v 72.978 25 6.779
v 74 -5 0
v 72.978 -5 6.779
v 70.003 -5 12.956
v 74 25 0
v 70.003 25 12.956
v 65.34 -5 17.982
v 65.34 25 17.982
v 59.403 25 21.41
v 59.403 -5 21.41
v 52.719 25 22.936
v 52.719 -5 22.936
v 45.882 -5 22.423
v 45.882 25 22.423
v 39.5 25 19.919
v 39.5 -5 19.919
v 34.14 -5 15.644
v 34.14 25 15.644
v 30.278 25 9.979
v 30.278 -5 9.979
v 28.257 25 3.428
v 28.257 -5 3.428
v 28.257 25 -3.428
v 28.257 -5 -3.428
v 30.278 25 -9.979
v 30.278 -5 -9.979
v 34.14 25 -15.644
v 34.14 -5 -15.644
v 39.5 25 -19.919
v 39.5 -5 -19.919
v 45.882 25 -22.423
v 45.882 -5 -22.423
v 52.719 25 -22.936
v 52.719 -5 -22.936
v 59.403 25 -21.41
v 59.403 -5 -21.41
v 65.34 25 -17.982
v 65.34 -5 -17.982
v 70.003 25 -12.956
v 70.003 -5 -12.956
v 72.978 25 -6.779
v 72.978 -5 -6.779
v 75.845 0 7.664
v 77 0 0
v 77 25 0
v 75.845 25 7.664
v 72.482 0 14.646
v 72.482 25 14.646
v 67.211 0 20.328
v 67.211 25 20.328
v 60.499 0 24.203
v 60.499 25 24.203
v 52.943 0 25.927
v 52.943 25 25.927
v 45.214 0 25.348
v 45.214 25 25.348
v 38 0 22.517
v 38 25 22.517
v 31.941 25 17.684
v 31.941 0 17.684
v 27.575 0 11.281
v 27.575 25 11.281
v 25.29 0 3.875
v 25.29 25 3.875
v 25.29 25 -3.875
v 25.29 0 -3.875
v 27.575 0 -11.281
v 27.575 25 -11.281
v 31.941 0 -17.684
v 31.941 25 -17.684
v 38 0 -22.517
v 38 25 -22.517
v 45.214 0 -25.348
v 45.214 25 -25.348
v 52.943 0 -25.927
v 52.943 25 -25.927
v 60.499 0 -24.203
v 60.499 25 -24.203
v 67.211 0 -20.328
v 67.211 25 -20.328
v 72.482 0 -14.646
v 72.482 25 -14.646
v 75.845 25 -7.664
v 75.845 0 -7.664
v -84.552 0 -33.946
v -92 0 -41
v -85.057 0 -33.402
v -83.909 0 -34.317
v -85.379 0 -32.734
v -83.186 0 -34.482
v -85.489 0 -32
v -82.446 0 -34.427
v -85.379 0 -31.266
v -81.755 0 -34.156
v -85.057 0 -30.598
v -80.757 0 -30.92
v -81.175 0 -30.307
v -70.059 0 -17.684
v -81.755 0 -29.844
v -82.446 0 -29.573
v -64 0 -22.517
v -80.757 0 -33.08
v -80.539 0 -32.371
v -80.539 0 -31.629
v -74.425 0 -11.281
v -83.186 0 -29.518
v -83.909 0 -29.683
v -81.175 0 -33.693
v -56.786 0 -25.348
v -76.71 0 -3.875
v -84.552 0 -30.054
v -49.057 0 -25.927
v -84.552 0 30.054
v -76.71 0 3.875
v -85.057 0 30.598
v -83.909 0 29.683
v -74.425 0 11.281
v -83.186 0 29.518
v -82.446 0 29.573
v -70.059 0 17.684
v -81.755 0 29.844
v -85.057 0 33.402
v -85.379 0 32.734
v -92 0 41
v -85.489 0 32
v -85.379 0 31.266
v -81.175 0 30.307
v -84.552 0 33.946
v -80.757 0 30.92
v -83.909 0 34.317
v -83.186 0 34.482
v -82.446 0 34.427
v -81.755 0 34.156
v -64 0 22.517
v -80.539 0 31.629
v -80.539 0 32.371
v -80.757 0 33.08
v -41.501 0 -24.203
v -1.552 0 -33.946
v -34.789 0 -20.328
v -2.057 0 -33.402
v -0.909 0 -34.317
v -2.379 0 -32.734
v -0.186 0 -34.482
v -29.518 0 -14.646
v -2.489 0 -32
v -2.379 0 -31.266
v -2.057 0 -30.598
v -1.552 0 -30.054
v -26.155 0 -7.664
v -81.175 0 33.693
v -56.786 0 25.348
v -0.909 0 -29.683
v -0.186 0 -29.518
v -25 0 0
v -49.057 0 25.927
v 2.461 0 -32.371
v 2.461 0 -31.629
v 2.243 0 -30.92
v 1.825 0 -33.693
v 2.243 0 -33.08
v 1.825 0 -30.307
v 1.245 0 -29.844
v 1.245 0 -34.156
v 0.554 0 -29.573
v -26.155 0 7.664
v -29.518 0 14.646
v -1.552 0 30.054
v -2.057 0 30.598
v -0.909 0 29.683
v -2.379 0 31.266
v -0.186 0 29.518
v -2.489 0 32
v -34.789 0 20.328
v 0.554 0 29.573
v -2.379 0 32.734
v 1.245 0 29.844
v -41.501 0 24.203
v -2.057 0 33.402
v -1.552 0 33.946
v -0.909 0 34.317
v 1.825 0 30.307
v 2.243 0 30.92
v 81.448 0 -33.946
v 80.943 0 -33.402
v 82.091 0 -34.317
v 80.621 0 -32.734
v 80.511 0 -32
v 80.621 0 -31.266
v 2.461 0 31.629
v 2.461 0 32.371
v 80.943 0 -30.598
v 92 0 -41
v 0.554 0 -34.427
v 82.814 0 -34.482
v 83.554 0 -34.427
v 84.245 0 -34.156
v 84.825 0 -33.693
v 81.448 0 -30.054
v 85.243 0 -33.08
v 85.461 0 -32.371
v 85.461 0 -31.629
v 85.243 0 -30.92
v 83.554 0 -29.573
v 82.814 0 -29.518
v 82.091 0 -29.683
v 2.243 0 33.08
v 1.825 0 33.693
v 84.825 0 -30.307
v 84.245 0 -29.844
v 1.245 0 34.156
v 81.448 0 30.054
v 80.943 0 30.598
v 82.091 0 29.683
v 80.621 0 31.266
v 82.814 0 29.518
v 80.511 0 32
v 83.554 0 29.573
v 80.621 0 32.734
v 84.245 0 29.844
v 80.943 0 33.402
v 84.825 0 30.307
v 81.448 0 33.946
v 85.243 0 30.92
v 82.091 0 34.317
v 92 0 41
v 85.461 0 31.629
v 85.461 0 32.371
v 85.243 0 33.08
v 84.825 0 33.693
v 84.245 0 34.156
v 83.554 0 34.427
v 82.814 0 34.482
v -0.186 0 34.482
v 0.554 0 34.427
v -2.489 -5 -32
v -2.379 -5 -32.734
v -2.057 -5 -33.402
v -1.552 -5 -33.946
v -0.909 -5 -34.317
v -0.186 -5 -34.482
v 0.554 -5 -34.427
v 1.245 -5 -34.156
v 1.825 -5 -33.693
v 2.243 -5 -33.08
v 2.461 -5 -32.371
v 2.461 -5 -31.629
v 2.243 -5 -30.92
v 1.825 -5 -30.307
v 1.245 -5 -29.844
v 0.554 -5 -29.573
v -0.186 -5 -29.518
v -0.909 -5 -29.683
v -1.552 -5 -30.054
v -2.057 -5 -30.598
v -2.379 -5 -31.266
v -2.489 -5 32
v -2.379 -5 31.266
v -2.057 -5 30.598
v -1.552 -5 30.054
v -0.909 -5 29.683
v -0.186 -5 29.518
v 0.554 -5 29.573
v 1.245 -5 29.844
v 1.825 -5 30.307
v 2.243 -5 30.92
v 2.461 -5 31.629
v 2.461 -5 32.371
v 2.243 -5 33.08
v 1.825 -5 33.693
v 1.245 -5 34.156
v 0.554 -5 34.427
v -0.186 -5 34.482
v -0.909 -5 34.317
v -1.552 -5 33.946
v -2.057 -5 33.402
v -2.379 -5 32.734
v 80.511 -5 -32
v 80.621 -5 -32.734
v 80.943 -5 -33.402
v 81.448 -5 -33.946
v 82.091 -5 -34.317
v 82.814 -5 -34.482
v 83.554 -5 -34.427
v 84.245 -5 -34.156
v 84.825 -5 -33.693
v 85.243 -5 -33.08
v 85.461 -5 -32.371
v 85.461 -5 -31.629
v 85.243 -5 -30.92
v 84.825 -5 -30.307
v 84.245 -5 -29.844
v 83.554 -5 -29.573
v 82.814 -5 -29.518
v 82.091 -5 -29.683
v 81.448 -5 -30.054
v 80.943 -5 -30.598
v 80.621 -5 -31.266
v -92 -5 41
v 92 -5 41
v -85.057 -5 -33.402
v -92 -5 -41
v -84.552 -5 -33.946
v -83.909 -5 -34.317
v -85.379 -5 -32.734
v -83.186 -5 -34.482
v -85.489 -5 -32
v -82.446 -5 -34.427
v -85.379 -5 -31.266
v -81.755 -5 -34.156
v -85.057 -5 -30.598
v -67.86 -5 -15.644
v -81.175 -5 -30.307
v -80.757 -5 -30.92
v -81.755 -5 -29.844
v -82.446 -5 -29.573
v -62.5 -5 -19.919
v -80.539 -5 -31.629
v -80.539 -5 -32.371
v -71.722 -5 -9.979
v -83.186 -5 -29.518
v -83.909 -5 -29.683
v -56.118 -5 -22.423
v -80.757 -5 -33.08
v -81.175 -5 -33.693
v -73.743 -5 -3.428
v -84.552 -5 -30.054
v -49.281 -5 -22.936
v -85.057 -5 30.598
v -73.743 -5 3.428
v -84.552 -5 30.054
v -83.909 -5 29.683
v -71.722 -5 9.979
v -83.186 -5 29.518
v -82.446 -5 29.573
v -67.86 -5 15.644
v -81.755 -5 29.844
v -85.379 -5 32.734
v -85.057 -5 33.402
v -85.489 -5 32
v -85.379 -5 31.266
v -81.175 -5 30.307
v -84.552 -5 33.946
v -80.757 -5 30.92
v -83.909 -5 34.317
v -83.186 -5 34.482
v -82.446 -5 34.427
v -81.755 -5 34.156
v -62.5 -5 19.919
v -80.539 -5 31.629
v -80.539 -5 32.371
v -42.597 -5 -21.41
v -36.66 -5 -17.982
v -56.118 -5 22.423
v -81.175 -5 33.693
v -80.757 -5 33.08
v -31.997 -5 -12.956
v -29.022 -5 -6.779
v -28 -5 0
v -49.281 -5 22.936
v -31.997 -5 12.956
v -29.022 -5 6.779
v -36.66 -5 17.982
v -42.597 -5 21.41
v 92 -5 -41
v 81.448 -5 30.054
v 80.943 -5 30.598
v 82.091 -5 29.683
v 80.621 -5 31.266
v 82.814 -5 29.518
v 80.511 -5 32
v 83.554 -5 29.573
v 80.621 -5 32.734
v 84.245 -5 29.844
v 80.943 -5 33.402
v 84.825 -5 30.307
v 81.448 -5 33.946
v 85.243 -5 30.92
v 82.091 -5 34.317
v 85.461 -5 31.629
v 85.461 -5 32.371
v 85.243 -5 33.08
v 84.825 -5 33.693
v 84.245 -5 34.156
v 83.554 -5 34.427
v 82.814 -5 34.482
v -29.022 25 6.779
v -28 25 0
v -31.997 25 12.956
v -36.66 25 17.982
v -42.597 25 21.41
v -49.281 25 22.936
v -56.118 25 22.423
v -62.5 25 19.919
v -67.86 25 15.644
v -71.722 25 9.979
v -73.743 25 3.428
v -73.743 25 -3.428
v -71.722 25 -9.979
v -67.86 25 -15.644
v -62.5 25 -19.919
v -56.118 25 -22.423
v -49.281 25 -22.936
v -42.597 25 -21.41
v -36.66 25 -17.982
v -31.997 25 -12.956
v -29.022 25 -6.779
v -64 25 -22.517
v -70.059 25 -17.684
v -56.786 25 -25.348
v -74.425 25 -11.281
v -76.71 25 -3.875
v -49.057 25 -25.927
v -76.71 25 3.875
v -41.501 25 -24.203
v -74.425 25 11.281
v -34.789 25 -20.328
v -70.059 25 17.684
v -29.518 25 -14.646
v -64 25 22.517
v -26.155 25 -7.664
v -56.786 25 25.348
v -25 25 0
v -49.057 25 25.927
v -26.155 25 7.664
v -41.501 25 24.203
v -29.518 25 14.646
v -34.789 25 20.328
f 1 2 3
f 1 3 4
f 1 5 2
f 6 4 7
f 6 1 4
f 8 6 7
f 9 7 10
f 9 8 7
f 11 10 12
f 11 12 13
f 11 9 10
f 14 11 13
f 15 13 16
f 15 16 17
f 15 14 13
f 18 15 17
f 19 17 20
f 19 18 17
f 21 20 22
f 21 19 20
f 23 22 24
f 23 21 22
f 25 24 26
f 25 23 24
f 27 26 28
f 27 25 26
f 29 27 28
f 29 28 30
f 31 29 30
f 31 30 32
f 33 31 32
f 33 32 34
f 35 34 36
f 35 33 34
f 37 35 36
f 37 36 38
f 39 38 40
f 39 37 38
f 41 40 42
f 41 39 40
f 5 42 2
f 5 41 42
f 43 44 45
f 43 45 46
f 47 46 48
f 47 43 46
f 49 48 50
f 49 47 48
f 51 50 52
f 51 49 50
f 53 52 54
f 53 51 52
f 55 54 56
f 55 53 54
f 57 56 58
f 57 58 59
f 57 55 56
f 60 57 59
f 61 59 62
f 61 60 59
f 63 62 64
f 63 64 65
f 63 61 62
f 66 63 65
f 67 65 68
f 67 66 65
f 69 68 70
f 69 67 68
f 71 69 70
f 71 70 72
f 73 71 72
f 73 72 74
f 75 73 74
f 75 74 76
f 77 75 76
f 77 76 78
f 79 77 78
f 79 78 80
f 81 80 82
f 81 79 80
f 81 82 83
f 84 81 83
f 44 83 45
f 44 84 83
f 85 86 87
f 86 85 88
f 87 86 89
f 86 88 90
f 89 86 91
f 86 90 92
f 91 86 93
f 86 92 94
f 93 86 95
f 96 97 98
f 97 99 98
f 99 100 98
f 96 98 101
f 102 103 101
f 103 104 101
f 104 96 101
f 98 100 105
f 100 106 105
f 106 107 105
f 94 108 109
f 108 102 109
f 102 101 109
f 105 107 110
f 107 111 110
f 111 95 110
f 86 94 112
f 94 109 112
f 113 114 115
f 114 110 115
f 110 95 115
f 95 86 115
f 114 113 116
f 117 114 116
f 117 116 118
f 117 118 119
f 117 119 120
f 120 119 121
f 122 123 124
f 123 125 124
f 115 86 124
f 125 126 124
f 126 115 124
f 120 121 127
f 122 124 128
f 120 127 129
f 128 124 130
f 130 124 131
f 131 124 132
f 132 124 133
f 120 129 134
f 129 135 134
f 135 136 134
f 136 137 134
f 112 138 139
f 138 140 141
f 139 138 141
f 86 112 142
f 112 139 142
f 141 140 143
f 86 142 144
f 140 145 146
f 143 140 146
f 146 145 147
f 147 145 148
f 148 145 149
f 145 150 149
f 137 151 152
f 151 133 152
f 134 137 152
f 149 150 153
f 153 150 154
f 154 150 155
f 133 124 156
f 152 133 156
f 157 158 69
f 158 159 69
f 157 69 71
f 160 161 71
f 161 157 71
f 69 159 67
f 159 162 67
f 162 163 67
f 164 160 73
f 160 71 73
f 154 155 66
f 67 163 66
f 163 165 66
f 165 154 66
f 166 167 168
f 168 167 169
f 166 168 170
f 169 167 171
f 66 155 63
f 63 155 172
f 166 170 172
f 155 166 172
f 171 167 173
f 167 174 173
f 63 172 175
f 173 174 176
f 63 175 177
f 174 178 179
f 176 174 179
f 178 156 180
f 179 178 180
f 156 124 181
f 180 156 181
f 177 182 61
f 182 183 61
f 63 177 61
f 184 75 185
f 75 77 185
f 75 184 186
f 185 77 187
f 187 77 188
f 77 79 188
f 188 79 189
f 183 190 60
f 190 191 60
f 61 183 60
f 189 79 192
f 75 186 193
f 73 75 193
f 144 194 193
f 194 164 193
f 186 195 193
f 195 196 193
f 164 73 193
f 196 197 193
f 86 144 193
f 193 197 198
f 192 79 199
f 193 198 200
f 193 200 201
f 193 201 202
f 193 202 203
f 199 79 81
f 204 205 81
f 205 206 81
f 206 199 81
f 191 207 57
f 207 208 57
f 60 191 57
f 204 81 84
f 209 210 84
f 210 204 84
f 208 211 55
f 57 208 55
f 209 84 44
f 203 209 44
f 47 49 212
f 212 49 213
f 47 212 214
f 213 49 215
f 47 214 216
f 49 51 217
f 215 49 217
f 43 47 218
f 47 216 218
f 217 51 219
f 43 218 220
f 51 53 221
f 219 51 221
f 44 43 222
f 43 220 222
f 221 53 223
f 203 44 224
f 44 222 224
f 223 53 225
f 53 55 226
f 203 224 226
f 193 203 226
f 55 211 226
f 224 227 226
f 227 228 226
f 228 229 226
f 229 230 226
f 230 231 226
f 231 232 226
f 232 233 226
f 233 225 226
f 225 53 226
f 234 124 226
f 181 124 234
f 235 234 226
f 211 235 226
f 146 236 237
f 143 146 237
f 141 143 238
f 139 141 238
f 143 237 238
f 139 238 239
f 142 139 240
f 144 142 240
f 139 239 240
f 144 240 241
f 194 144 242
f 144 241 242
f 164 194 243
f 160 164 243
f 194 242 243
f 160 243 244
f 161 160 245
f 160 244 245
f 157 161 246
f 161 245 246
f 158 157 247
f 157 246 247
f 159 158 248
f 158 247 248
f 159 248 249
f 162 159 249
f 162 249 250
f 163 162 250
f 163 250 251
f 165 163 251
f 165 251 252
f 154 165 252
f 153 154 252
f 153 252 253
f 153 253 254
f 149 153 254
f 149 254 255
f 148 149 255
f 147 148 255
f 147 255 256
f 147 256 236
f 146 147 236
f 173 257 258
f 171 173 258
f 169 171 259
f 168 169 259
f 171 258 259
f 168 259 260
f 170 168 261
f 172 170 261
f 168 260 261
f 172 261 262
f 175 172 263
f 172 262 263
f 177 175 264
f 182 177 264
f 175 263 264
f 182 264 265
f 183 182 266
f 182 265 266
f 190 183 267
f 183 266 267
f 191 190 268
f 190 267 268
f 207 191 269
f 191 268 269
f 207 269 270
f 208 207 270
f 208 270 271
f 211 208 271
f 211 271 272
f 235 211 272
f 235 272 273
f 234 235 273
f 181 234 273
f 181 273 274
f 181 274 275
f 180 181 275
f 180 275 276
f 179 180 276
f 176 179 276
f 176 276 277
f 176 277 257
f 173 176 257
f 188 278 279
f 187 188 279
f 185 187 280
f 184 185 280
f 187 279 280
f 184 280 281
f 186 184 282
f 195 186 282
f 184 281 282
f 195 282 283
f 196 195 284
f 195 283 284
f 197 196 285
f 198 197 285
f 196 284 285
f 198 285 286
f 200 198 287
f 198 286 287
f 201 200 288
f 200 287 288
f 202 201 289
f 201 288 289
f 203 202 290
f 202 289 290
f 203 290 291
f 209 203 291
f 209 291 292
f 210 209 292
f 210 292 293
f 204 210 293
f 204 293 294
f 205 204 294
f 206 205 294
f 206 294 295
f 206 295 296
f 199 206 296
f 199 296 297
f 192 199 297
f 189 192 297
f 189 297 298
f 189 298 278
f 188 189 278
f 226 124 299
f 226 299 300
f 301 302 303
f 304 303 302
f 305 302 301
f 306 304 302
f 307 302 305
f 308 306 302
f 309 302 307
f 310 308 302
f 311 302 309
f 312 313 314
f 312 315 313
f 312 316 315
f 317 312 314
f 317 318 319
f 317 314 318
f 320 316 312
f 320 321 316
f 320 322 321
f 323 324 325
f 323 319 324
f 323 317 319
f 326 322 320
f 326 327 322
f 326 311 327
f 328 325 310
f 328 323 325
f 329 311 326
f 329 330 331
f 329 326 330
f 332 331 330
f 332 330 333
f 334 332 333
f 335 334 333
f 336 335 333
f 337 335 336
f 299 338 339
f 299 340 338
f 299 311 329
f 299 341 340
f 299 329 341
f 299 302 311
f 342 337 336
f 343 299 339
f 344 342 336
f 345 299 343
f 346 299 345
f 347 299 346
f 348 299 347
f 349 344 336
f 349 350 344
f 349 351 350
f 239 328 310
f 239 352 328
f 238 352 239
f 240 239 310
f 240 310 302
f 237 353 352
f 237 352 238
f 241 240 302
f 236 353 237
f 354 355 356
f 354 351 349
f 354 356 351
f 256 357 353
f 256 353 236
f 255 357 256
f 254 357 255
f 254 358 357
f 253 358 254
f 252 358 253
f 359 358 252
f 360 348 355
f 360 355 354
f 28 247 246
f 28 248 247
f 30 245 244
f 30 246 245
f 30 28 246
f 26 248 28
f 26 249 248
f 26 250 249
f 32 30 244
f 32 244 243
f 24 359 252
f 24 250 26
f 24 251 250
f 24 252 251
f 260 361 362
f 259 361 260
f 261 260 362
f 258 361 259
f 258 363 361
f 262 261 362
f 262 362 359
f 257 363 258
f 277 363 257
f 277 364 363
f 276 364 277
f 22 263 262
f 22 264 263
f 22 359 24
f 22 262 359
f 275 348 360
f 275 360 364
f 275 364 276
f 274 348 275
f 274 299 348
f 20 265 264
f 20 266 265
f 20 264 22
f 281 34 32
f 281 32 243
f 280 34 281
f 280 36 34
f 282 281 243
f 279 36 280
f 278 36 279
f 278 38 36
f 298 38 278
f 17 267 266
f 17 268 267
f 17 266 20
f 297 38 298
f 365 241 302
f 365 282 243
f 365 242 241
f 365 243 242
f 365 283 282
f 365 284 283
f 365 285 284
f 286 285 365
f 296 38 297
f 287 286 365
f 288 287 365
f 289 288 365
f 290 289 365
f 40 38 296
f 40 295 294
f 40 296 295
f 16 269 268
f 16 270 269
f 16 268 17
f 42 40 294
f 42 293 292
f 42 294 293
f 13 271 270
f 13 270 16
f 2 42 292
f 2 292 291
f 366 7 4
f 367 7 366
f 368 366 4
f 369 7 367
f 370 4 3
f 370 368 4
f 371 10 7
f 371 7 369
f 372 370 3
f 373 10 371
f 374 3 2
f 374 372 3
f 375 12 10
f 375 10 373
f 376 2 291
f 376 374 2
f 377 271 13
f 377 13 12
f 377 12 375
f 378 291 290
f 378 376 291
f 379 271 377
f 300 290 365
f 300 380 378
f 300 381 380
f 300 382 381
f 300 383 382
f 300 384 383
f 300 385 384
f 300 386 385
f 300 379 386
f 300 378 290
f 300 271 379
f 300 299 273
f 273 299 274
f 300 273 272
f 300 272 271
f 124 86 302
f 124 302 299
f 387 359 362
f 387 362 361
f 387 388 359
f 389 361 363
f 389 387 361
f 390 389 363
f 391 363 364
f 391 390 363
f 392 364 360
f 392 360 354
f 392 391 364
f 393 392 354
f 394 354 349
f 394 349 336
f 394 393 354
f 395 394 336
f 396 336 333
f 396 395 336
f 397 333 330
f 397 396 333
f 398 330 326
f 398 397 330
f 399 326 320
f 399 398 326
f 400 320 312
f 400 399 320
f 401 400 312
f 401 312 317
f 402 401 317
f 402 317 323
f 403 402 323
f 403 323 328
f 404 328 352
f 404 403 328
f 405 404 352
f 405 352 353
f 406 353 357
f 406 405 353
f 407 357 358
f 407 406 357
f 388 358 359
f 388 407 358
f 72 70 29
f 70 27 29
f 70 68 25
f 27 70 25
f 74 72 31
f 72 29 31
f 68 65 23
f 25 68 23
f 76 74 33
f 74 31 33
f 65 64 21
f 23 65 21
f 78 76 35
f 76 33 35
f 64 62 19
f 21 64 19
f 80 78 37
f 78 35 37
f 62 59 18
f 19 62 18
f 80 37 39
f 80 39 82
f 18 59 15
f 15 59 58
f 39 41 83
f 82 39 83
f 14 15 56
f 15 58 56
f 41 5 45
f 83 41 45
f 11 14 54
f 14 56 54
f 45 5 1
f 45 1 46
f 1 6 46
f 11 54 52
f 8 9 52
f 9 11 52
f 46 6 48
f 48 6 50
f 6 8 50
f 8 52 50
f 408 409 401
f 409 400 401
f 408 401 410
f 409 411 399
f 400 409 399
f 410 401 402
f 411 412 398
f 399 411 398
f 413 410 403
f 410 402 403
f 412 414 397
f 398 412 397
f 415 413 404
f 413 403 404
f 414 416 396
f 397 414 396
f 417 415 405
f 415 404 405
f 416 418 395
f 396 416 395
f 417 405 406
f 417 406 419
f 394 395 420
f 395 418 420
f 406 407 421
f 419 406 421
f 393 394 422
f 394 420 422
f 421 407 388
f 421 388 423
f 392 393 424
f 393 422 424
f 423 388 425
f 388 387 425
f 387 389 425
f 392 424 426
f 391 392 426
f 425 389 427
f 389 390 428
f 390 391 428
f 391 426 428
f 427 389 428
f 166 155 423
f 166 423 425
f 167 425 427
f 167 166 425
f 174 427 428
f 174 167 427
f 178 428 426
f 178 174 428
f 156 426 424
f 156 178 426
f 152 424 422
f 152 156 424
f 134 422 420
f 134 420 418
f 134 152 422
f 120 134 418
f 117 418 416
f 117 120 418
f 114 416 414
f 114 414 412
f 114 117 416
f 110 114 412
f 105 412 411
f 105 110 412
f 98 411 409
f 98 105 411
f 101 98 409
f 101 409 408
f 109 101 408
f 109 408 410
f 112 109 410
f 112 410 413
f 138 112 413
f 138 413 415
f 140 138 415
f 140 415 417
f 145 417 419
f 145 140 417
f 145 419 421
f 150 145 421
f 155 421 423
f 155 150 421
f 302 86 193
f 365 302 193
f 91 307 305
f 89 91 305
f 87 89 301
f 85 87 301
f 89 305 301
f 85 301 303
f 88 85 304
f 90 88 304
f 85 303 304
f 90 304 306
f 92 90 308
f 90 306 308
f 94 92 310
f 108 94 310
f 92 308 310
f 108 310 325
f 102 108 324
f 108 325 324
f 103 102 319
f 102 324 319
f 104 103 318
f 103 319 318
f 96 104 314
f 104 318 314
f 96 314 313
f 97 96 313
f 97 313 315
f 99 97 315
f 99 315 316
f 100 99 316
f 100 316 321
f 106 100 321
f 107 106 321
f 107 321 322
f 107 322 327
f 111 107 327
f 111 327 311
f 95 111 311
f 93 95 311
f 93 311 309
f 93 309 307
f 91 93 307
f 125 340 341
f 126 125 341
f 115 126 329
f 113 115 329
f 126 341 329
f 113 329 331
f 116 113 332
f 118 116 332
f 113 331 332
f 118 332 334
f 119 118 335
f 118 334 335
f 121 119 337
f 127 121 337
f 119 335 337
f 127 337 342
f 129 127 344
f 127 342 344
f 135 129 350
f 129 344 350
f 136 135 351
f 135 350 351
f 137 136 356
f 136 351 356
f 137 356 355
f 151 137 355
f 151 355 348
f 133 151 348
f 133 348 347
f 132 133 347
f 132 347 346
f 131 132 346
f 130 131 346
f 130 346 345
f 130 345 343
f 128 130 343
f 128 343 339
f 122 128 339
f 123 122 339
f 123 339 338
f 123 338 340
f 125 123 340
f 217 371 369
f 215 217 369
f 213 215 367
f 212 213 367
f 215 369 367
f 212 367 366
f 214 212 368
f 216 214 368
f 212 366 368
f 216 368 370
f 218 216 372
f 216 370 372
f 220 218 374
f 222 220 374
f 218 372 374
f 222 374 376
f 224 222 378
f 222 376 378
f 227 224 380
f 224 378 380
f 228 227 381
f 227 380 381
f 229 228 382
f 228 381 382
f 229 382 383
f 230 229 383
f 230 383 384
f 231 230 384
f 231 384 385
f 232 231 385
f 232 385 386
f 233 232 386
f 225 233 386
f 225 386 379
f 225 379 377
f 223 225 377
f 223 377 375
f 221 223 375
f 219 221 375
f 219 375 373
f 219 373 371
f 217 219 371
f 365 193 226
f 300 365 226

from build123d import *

# Parameters (mm, degrees)
F0_W     = 184
F0_H     = 82
F0_R     = 26
F1_DEPTH = 5
F0_R_2   = 23
F2_DEPTH = 25
F3_DEPTH = 5
F5_D     = 4.9784


with BuildPart() as f1:
    # F0 (on Front) → F1 (new body)
    with BuildSketch(Plane.XZ):
        Rectangle(F0_W, F0_H)
        with Locations((-51, 0)):
            Circle(F0_R, mode=Mode.SUBTRACT)
        with Locations((51, 0)):
            Circle(F0_R, mode=Mode.SUBTRACT)
    extrude(amount=F1_DEPTH)

    # F0 (on Front) → F2 (join)
    with BuildSketch(Plane.XZ):
        with Locations((-51, 0)):
            Circle(F0_R)
        with Locations((-51, 0)):
            Circle(F0_R_2, mode=Mode.SUBTRACT)
        with Locations((51, 0)):
            Circle(F0_R)
        with Locations((51, 0)):
            Circle(F0_R_2, mode=Mode.SUBTRACT)
    extrude(amount=-F2_DEPTH)

    # F0 (on Front) → F3 (join)
    with BuildSketch(Plane.XZ):
        with Locations((-51, 0)):
            Circle(F0_R)
        with Locations((-51, 0)):
            Circle(F0_R_2, mode=Mode.SUBTRACT)
        with Locations((51, 0)):
            Circle(F0_R)
        with Locations((51, 0)):
            Circle(F0_R_2, mode=Mode.SUBTRACT)
    extrude(amount=F3_DEPTH)

    # F5 (through all)
    with Locations(Plane(origin=(0, 0, 0), x_dir=(1, 0, 0), z_dir=(0, 1, 0))):
        with Locations((-83, -32), (0, -32), (83, -32), (83, 32), (0, 32), (-83, 32)):
            Hole(F5_D / 2)


solid = f1.part
